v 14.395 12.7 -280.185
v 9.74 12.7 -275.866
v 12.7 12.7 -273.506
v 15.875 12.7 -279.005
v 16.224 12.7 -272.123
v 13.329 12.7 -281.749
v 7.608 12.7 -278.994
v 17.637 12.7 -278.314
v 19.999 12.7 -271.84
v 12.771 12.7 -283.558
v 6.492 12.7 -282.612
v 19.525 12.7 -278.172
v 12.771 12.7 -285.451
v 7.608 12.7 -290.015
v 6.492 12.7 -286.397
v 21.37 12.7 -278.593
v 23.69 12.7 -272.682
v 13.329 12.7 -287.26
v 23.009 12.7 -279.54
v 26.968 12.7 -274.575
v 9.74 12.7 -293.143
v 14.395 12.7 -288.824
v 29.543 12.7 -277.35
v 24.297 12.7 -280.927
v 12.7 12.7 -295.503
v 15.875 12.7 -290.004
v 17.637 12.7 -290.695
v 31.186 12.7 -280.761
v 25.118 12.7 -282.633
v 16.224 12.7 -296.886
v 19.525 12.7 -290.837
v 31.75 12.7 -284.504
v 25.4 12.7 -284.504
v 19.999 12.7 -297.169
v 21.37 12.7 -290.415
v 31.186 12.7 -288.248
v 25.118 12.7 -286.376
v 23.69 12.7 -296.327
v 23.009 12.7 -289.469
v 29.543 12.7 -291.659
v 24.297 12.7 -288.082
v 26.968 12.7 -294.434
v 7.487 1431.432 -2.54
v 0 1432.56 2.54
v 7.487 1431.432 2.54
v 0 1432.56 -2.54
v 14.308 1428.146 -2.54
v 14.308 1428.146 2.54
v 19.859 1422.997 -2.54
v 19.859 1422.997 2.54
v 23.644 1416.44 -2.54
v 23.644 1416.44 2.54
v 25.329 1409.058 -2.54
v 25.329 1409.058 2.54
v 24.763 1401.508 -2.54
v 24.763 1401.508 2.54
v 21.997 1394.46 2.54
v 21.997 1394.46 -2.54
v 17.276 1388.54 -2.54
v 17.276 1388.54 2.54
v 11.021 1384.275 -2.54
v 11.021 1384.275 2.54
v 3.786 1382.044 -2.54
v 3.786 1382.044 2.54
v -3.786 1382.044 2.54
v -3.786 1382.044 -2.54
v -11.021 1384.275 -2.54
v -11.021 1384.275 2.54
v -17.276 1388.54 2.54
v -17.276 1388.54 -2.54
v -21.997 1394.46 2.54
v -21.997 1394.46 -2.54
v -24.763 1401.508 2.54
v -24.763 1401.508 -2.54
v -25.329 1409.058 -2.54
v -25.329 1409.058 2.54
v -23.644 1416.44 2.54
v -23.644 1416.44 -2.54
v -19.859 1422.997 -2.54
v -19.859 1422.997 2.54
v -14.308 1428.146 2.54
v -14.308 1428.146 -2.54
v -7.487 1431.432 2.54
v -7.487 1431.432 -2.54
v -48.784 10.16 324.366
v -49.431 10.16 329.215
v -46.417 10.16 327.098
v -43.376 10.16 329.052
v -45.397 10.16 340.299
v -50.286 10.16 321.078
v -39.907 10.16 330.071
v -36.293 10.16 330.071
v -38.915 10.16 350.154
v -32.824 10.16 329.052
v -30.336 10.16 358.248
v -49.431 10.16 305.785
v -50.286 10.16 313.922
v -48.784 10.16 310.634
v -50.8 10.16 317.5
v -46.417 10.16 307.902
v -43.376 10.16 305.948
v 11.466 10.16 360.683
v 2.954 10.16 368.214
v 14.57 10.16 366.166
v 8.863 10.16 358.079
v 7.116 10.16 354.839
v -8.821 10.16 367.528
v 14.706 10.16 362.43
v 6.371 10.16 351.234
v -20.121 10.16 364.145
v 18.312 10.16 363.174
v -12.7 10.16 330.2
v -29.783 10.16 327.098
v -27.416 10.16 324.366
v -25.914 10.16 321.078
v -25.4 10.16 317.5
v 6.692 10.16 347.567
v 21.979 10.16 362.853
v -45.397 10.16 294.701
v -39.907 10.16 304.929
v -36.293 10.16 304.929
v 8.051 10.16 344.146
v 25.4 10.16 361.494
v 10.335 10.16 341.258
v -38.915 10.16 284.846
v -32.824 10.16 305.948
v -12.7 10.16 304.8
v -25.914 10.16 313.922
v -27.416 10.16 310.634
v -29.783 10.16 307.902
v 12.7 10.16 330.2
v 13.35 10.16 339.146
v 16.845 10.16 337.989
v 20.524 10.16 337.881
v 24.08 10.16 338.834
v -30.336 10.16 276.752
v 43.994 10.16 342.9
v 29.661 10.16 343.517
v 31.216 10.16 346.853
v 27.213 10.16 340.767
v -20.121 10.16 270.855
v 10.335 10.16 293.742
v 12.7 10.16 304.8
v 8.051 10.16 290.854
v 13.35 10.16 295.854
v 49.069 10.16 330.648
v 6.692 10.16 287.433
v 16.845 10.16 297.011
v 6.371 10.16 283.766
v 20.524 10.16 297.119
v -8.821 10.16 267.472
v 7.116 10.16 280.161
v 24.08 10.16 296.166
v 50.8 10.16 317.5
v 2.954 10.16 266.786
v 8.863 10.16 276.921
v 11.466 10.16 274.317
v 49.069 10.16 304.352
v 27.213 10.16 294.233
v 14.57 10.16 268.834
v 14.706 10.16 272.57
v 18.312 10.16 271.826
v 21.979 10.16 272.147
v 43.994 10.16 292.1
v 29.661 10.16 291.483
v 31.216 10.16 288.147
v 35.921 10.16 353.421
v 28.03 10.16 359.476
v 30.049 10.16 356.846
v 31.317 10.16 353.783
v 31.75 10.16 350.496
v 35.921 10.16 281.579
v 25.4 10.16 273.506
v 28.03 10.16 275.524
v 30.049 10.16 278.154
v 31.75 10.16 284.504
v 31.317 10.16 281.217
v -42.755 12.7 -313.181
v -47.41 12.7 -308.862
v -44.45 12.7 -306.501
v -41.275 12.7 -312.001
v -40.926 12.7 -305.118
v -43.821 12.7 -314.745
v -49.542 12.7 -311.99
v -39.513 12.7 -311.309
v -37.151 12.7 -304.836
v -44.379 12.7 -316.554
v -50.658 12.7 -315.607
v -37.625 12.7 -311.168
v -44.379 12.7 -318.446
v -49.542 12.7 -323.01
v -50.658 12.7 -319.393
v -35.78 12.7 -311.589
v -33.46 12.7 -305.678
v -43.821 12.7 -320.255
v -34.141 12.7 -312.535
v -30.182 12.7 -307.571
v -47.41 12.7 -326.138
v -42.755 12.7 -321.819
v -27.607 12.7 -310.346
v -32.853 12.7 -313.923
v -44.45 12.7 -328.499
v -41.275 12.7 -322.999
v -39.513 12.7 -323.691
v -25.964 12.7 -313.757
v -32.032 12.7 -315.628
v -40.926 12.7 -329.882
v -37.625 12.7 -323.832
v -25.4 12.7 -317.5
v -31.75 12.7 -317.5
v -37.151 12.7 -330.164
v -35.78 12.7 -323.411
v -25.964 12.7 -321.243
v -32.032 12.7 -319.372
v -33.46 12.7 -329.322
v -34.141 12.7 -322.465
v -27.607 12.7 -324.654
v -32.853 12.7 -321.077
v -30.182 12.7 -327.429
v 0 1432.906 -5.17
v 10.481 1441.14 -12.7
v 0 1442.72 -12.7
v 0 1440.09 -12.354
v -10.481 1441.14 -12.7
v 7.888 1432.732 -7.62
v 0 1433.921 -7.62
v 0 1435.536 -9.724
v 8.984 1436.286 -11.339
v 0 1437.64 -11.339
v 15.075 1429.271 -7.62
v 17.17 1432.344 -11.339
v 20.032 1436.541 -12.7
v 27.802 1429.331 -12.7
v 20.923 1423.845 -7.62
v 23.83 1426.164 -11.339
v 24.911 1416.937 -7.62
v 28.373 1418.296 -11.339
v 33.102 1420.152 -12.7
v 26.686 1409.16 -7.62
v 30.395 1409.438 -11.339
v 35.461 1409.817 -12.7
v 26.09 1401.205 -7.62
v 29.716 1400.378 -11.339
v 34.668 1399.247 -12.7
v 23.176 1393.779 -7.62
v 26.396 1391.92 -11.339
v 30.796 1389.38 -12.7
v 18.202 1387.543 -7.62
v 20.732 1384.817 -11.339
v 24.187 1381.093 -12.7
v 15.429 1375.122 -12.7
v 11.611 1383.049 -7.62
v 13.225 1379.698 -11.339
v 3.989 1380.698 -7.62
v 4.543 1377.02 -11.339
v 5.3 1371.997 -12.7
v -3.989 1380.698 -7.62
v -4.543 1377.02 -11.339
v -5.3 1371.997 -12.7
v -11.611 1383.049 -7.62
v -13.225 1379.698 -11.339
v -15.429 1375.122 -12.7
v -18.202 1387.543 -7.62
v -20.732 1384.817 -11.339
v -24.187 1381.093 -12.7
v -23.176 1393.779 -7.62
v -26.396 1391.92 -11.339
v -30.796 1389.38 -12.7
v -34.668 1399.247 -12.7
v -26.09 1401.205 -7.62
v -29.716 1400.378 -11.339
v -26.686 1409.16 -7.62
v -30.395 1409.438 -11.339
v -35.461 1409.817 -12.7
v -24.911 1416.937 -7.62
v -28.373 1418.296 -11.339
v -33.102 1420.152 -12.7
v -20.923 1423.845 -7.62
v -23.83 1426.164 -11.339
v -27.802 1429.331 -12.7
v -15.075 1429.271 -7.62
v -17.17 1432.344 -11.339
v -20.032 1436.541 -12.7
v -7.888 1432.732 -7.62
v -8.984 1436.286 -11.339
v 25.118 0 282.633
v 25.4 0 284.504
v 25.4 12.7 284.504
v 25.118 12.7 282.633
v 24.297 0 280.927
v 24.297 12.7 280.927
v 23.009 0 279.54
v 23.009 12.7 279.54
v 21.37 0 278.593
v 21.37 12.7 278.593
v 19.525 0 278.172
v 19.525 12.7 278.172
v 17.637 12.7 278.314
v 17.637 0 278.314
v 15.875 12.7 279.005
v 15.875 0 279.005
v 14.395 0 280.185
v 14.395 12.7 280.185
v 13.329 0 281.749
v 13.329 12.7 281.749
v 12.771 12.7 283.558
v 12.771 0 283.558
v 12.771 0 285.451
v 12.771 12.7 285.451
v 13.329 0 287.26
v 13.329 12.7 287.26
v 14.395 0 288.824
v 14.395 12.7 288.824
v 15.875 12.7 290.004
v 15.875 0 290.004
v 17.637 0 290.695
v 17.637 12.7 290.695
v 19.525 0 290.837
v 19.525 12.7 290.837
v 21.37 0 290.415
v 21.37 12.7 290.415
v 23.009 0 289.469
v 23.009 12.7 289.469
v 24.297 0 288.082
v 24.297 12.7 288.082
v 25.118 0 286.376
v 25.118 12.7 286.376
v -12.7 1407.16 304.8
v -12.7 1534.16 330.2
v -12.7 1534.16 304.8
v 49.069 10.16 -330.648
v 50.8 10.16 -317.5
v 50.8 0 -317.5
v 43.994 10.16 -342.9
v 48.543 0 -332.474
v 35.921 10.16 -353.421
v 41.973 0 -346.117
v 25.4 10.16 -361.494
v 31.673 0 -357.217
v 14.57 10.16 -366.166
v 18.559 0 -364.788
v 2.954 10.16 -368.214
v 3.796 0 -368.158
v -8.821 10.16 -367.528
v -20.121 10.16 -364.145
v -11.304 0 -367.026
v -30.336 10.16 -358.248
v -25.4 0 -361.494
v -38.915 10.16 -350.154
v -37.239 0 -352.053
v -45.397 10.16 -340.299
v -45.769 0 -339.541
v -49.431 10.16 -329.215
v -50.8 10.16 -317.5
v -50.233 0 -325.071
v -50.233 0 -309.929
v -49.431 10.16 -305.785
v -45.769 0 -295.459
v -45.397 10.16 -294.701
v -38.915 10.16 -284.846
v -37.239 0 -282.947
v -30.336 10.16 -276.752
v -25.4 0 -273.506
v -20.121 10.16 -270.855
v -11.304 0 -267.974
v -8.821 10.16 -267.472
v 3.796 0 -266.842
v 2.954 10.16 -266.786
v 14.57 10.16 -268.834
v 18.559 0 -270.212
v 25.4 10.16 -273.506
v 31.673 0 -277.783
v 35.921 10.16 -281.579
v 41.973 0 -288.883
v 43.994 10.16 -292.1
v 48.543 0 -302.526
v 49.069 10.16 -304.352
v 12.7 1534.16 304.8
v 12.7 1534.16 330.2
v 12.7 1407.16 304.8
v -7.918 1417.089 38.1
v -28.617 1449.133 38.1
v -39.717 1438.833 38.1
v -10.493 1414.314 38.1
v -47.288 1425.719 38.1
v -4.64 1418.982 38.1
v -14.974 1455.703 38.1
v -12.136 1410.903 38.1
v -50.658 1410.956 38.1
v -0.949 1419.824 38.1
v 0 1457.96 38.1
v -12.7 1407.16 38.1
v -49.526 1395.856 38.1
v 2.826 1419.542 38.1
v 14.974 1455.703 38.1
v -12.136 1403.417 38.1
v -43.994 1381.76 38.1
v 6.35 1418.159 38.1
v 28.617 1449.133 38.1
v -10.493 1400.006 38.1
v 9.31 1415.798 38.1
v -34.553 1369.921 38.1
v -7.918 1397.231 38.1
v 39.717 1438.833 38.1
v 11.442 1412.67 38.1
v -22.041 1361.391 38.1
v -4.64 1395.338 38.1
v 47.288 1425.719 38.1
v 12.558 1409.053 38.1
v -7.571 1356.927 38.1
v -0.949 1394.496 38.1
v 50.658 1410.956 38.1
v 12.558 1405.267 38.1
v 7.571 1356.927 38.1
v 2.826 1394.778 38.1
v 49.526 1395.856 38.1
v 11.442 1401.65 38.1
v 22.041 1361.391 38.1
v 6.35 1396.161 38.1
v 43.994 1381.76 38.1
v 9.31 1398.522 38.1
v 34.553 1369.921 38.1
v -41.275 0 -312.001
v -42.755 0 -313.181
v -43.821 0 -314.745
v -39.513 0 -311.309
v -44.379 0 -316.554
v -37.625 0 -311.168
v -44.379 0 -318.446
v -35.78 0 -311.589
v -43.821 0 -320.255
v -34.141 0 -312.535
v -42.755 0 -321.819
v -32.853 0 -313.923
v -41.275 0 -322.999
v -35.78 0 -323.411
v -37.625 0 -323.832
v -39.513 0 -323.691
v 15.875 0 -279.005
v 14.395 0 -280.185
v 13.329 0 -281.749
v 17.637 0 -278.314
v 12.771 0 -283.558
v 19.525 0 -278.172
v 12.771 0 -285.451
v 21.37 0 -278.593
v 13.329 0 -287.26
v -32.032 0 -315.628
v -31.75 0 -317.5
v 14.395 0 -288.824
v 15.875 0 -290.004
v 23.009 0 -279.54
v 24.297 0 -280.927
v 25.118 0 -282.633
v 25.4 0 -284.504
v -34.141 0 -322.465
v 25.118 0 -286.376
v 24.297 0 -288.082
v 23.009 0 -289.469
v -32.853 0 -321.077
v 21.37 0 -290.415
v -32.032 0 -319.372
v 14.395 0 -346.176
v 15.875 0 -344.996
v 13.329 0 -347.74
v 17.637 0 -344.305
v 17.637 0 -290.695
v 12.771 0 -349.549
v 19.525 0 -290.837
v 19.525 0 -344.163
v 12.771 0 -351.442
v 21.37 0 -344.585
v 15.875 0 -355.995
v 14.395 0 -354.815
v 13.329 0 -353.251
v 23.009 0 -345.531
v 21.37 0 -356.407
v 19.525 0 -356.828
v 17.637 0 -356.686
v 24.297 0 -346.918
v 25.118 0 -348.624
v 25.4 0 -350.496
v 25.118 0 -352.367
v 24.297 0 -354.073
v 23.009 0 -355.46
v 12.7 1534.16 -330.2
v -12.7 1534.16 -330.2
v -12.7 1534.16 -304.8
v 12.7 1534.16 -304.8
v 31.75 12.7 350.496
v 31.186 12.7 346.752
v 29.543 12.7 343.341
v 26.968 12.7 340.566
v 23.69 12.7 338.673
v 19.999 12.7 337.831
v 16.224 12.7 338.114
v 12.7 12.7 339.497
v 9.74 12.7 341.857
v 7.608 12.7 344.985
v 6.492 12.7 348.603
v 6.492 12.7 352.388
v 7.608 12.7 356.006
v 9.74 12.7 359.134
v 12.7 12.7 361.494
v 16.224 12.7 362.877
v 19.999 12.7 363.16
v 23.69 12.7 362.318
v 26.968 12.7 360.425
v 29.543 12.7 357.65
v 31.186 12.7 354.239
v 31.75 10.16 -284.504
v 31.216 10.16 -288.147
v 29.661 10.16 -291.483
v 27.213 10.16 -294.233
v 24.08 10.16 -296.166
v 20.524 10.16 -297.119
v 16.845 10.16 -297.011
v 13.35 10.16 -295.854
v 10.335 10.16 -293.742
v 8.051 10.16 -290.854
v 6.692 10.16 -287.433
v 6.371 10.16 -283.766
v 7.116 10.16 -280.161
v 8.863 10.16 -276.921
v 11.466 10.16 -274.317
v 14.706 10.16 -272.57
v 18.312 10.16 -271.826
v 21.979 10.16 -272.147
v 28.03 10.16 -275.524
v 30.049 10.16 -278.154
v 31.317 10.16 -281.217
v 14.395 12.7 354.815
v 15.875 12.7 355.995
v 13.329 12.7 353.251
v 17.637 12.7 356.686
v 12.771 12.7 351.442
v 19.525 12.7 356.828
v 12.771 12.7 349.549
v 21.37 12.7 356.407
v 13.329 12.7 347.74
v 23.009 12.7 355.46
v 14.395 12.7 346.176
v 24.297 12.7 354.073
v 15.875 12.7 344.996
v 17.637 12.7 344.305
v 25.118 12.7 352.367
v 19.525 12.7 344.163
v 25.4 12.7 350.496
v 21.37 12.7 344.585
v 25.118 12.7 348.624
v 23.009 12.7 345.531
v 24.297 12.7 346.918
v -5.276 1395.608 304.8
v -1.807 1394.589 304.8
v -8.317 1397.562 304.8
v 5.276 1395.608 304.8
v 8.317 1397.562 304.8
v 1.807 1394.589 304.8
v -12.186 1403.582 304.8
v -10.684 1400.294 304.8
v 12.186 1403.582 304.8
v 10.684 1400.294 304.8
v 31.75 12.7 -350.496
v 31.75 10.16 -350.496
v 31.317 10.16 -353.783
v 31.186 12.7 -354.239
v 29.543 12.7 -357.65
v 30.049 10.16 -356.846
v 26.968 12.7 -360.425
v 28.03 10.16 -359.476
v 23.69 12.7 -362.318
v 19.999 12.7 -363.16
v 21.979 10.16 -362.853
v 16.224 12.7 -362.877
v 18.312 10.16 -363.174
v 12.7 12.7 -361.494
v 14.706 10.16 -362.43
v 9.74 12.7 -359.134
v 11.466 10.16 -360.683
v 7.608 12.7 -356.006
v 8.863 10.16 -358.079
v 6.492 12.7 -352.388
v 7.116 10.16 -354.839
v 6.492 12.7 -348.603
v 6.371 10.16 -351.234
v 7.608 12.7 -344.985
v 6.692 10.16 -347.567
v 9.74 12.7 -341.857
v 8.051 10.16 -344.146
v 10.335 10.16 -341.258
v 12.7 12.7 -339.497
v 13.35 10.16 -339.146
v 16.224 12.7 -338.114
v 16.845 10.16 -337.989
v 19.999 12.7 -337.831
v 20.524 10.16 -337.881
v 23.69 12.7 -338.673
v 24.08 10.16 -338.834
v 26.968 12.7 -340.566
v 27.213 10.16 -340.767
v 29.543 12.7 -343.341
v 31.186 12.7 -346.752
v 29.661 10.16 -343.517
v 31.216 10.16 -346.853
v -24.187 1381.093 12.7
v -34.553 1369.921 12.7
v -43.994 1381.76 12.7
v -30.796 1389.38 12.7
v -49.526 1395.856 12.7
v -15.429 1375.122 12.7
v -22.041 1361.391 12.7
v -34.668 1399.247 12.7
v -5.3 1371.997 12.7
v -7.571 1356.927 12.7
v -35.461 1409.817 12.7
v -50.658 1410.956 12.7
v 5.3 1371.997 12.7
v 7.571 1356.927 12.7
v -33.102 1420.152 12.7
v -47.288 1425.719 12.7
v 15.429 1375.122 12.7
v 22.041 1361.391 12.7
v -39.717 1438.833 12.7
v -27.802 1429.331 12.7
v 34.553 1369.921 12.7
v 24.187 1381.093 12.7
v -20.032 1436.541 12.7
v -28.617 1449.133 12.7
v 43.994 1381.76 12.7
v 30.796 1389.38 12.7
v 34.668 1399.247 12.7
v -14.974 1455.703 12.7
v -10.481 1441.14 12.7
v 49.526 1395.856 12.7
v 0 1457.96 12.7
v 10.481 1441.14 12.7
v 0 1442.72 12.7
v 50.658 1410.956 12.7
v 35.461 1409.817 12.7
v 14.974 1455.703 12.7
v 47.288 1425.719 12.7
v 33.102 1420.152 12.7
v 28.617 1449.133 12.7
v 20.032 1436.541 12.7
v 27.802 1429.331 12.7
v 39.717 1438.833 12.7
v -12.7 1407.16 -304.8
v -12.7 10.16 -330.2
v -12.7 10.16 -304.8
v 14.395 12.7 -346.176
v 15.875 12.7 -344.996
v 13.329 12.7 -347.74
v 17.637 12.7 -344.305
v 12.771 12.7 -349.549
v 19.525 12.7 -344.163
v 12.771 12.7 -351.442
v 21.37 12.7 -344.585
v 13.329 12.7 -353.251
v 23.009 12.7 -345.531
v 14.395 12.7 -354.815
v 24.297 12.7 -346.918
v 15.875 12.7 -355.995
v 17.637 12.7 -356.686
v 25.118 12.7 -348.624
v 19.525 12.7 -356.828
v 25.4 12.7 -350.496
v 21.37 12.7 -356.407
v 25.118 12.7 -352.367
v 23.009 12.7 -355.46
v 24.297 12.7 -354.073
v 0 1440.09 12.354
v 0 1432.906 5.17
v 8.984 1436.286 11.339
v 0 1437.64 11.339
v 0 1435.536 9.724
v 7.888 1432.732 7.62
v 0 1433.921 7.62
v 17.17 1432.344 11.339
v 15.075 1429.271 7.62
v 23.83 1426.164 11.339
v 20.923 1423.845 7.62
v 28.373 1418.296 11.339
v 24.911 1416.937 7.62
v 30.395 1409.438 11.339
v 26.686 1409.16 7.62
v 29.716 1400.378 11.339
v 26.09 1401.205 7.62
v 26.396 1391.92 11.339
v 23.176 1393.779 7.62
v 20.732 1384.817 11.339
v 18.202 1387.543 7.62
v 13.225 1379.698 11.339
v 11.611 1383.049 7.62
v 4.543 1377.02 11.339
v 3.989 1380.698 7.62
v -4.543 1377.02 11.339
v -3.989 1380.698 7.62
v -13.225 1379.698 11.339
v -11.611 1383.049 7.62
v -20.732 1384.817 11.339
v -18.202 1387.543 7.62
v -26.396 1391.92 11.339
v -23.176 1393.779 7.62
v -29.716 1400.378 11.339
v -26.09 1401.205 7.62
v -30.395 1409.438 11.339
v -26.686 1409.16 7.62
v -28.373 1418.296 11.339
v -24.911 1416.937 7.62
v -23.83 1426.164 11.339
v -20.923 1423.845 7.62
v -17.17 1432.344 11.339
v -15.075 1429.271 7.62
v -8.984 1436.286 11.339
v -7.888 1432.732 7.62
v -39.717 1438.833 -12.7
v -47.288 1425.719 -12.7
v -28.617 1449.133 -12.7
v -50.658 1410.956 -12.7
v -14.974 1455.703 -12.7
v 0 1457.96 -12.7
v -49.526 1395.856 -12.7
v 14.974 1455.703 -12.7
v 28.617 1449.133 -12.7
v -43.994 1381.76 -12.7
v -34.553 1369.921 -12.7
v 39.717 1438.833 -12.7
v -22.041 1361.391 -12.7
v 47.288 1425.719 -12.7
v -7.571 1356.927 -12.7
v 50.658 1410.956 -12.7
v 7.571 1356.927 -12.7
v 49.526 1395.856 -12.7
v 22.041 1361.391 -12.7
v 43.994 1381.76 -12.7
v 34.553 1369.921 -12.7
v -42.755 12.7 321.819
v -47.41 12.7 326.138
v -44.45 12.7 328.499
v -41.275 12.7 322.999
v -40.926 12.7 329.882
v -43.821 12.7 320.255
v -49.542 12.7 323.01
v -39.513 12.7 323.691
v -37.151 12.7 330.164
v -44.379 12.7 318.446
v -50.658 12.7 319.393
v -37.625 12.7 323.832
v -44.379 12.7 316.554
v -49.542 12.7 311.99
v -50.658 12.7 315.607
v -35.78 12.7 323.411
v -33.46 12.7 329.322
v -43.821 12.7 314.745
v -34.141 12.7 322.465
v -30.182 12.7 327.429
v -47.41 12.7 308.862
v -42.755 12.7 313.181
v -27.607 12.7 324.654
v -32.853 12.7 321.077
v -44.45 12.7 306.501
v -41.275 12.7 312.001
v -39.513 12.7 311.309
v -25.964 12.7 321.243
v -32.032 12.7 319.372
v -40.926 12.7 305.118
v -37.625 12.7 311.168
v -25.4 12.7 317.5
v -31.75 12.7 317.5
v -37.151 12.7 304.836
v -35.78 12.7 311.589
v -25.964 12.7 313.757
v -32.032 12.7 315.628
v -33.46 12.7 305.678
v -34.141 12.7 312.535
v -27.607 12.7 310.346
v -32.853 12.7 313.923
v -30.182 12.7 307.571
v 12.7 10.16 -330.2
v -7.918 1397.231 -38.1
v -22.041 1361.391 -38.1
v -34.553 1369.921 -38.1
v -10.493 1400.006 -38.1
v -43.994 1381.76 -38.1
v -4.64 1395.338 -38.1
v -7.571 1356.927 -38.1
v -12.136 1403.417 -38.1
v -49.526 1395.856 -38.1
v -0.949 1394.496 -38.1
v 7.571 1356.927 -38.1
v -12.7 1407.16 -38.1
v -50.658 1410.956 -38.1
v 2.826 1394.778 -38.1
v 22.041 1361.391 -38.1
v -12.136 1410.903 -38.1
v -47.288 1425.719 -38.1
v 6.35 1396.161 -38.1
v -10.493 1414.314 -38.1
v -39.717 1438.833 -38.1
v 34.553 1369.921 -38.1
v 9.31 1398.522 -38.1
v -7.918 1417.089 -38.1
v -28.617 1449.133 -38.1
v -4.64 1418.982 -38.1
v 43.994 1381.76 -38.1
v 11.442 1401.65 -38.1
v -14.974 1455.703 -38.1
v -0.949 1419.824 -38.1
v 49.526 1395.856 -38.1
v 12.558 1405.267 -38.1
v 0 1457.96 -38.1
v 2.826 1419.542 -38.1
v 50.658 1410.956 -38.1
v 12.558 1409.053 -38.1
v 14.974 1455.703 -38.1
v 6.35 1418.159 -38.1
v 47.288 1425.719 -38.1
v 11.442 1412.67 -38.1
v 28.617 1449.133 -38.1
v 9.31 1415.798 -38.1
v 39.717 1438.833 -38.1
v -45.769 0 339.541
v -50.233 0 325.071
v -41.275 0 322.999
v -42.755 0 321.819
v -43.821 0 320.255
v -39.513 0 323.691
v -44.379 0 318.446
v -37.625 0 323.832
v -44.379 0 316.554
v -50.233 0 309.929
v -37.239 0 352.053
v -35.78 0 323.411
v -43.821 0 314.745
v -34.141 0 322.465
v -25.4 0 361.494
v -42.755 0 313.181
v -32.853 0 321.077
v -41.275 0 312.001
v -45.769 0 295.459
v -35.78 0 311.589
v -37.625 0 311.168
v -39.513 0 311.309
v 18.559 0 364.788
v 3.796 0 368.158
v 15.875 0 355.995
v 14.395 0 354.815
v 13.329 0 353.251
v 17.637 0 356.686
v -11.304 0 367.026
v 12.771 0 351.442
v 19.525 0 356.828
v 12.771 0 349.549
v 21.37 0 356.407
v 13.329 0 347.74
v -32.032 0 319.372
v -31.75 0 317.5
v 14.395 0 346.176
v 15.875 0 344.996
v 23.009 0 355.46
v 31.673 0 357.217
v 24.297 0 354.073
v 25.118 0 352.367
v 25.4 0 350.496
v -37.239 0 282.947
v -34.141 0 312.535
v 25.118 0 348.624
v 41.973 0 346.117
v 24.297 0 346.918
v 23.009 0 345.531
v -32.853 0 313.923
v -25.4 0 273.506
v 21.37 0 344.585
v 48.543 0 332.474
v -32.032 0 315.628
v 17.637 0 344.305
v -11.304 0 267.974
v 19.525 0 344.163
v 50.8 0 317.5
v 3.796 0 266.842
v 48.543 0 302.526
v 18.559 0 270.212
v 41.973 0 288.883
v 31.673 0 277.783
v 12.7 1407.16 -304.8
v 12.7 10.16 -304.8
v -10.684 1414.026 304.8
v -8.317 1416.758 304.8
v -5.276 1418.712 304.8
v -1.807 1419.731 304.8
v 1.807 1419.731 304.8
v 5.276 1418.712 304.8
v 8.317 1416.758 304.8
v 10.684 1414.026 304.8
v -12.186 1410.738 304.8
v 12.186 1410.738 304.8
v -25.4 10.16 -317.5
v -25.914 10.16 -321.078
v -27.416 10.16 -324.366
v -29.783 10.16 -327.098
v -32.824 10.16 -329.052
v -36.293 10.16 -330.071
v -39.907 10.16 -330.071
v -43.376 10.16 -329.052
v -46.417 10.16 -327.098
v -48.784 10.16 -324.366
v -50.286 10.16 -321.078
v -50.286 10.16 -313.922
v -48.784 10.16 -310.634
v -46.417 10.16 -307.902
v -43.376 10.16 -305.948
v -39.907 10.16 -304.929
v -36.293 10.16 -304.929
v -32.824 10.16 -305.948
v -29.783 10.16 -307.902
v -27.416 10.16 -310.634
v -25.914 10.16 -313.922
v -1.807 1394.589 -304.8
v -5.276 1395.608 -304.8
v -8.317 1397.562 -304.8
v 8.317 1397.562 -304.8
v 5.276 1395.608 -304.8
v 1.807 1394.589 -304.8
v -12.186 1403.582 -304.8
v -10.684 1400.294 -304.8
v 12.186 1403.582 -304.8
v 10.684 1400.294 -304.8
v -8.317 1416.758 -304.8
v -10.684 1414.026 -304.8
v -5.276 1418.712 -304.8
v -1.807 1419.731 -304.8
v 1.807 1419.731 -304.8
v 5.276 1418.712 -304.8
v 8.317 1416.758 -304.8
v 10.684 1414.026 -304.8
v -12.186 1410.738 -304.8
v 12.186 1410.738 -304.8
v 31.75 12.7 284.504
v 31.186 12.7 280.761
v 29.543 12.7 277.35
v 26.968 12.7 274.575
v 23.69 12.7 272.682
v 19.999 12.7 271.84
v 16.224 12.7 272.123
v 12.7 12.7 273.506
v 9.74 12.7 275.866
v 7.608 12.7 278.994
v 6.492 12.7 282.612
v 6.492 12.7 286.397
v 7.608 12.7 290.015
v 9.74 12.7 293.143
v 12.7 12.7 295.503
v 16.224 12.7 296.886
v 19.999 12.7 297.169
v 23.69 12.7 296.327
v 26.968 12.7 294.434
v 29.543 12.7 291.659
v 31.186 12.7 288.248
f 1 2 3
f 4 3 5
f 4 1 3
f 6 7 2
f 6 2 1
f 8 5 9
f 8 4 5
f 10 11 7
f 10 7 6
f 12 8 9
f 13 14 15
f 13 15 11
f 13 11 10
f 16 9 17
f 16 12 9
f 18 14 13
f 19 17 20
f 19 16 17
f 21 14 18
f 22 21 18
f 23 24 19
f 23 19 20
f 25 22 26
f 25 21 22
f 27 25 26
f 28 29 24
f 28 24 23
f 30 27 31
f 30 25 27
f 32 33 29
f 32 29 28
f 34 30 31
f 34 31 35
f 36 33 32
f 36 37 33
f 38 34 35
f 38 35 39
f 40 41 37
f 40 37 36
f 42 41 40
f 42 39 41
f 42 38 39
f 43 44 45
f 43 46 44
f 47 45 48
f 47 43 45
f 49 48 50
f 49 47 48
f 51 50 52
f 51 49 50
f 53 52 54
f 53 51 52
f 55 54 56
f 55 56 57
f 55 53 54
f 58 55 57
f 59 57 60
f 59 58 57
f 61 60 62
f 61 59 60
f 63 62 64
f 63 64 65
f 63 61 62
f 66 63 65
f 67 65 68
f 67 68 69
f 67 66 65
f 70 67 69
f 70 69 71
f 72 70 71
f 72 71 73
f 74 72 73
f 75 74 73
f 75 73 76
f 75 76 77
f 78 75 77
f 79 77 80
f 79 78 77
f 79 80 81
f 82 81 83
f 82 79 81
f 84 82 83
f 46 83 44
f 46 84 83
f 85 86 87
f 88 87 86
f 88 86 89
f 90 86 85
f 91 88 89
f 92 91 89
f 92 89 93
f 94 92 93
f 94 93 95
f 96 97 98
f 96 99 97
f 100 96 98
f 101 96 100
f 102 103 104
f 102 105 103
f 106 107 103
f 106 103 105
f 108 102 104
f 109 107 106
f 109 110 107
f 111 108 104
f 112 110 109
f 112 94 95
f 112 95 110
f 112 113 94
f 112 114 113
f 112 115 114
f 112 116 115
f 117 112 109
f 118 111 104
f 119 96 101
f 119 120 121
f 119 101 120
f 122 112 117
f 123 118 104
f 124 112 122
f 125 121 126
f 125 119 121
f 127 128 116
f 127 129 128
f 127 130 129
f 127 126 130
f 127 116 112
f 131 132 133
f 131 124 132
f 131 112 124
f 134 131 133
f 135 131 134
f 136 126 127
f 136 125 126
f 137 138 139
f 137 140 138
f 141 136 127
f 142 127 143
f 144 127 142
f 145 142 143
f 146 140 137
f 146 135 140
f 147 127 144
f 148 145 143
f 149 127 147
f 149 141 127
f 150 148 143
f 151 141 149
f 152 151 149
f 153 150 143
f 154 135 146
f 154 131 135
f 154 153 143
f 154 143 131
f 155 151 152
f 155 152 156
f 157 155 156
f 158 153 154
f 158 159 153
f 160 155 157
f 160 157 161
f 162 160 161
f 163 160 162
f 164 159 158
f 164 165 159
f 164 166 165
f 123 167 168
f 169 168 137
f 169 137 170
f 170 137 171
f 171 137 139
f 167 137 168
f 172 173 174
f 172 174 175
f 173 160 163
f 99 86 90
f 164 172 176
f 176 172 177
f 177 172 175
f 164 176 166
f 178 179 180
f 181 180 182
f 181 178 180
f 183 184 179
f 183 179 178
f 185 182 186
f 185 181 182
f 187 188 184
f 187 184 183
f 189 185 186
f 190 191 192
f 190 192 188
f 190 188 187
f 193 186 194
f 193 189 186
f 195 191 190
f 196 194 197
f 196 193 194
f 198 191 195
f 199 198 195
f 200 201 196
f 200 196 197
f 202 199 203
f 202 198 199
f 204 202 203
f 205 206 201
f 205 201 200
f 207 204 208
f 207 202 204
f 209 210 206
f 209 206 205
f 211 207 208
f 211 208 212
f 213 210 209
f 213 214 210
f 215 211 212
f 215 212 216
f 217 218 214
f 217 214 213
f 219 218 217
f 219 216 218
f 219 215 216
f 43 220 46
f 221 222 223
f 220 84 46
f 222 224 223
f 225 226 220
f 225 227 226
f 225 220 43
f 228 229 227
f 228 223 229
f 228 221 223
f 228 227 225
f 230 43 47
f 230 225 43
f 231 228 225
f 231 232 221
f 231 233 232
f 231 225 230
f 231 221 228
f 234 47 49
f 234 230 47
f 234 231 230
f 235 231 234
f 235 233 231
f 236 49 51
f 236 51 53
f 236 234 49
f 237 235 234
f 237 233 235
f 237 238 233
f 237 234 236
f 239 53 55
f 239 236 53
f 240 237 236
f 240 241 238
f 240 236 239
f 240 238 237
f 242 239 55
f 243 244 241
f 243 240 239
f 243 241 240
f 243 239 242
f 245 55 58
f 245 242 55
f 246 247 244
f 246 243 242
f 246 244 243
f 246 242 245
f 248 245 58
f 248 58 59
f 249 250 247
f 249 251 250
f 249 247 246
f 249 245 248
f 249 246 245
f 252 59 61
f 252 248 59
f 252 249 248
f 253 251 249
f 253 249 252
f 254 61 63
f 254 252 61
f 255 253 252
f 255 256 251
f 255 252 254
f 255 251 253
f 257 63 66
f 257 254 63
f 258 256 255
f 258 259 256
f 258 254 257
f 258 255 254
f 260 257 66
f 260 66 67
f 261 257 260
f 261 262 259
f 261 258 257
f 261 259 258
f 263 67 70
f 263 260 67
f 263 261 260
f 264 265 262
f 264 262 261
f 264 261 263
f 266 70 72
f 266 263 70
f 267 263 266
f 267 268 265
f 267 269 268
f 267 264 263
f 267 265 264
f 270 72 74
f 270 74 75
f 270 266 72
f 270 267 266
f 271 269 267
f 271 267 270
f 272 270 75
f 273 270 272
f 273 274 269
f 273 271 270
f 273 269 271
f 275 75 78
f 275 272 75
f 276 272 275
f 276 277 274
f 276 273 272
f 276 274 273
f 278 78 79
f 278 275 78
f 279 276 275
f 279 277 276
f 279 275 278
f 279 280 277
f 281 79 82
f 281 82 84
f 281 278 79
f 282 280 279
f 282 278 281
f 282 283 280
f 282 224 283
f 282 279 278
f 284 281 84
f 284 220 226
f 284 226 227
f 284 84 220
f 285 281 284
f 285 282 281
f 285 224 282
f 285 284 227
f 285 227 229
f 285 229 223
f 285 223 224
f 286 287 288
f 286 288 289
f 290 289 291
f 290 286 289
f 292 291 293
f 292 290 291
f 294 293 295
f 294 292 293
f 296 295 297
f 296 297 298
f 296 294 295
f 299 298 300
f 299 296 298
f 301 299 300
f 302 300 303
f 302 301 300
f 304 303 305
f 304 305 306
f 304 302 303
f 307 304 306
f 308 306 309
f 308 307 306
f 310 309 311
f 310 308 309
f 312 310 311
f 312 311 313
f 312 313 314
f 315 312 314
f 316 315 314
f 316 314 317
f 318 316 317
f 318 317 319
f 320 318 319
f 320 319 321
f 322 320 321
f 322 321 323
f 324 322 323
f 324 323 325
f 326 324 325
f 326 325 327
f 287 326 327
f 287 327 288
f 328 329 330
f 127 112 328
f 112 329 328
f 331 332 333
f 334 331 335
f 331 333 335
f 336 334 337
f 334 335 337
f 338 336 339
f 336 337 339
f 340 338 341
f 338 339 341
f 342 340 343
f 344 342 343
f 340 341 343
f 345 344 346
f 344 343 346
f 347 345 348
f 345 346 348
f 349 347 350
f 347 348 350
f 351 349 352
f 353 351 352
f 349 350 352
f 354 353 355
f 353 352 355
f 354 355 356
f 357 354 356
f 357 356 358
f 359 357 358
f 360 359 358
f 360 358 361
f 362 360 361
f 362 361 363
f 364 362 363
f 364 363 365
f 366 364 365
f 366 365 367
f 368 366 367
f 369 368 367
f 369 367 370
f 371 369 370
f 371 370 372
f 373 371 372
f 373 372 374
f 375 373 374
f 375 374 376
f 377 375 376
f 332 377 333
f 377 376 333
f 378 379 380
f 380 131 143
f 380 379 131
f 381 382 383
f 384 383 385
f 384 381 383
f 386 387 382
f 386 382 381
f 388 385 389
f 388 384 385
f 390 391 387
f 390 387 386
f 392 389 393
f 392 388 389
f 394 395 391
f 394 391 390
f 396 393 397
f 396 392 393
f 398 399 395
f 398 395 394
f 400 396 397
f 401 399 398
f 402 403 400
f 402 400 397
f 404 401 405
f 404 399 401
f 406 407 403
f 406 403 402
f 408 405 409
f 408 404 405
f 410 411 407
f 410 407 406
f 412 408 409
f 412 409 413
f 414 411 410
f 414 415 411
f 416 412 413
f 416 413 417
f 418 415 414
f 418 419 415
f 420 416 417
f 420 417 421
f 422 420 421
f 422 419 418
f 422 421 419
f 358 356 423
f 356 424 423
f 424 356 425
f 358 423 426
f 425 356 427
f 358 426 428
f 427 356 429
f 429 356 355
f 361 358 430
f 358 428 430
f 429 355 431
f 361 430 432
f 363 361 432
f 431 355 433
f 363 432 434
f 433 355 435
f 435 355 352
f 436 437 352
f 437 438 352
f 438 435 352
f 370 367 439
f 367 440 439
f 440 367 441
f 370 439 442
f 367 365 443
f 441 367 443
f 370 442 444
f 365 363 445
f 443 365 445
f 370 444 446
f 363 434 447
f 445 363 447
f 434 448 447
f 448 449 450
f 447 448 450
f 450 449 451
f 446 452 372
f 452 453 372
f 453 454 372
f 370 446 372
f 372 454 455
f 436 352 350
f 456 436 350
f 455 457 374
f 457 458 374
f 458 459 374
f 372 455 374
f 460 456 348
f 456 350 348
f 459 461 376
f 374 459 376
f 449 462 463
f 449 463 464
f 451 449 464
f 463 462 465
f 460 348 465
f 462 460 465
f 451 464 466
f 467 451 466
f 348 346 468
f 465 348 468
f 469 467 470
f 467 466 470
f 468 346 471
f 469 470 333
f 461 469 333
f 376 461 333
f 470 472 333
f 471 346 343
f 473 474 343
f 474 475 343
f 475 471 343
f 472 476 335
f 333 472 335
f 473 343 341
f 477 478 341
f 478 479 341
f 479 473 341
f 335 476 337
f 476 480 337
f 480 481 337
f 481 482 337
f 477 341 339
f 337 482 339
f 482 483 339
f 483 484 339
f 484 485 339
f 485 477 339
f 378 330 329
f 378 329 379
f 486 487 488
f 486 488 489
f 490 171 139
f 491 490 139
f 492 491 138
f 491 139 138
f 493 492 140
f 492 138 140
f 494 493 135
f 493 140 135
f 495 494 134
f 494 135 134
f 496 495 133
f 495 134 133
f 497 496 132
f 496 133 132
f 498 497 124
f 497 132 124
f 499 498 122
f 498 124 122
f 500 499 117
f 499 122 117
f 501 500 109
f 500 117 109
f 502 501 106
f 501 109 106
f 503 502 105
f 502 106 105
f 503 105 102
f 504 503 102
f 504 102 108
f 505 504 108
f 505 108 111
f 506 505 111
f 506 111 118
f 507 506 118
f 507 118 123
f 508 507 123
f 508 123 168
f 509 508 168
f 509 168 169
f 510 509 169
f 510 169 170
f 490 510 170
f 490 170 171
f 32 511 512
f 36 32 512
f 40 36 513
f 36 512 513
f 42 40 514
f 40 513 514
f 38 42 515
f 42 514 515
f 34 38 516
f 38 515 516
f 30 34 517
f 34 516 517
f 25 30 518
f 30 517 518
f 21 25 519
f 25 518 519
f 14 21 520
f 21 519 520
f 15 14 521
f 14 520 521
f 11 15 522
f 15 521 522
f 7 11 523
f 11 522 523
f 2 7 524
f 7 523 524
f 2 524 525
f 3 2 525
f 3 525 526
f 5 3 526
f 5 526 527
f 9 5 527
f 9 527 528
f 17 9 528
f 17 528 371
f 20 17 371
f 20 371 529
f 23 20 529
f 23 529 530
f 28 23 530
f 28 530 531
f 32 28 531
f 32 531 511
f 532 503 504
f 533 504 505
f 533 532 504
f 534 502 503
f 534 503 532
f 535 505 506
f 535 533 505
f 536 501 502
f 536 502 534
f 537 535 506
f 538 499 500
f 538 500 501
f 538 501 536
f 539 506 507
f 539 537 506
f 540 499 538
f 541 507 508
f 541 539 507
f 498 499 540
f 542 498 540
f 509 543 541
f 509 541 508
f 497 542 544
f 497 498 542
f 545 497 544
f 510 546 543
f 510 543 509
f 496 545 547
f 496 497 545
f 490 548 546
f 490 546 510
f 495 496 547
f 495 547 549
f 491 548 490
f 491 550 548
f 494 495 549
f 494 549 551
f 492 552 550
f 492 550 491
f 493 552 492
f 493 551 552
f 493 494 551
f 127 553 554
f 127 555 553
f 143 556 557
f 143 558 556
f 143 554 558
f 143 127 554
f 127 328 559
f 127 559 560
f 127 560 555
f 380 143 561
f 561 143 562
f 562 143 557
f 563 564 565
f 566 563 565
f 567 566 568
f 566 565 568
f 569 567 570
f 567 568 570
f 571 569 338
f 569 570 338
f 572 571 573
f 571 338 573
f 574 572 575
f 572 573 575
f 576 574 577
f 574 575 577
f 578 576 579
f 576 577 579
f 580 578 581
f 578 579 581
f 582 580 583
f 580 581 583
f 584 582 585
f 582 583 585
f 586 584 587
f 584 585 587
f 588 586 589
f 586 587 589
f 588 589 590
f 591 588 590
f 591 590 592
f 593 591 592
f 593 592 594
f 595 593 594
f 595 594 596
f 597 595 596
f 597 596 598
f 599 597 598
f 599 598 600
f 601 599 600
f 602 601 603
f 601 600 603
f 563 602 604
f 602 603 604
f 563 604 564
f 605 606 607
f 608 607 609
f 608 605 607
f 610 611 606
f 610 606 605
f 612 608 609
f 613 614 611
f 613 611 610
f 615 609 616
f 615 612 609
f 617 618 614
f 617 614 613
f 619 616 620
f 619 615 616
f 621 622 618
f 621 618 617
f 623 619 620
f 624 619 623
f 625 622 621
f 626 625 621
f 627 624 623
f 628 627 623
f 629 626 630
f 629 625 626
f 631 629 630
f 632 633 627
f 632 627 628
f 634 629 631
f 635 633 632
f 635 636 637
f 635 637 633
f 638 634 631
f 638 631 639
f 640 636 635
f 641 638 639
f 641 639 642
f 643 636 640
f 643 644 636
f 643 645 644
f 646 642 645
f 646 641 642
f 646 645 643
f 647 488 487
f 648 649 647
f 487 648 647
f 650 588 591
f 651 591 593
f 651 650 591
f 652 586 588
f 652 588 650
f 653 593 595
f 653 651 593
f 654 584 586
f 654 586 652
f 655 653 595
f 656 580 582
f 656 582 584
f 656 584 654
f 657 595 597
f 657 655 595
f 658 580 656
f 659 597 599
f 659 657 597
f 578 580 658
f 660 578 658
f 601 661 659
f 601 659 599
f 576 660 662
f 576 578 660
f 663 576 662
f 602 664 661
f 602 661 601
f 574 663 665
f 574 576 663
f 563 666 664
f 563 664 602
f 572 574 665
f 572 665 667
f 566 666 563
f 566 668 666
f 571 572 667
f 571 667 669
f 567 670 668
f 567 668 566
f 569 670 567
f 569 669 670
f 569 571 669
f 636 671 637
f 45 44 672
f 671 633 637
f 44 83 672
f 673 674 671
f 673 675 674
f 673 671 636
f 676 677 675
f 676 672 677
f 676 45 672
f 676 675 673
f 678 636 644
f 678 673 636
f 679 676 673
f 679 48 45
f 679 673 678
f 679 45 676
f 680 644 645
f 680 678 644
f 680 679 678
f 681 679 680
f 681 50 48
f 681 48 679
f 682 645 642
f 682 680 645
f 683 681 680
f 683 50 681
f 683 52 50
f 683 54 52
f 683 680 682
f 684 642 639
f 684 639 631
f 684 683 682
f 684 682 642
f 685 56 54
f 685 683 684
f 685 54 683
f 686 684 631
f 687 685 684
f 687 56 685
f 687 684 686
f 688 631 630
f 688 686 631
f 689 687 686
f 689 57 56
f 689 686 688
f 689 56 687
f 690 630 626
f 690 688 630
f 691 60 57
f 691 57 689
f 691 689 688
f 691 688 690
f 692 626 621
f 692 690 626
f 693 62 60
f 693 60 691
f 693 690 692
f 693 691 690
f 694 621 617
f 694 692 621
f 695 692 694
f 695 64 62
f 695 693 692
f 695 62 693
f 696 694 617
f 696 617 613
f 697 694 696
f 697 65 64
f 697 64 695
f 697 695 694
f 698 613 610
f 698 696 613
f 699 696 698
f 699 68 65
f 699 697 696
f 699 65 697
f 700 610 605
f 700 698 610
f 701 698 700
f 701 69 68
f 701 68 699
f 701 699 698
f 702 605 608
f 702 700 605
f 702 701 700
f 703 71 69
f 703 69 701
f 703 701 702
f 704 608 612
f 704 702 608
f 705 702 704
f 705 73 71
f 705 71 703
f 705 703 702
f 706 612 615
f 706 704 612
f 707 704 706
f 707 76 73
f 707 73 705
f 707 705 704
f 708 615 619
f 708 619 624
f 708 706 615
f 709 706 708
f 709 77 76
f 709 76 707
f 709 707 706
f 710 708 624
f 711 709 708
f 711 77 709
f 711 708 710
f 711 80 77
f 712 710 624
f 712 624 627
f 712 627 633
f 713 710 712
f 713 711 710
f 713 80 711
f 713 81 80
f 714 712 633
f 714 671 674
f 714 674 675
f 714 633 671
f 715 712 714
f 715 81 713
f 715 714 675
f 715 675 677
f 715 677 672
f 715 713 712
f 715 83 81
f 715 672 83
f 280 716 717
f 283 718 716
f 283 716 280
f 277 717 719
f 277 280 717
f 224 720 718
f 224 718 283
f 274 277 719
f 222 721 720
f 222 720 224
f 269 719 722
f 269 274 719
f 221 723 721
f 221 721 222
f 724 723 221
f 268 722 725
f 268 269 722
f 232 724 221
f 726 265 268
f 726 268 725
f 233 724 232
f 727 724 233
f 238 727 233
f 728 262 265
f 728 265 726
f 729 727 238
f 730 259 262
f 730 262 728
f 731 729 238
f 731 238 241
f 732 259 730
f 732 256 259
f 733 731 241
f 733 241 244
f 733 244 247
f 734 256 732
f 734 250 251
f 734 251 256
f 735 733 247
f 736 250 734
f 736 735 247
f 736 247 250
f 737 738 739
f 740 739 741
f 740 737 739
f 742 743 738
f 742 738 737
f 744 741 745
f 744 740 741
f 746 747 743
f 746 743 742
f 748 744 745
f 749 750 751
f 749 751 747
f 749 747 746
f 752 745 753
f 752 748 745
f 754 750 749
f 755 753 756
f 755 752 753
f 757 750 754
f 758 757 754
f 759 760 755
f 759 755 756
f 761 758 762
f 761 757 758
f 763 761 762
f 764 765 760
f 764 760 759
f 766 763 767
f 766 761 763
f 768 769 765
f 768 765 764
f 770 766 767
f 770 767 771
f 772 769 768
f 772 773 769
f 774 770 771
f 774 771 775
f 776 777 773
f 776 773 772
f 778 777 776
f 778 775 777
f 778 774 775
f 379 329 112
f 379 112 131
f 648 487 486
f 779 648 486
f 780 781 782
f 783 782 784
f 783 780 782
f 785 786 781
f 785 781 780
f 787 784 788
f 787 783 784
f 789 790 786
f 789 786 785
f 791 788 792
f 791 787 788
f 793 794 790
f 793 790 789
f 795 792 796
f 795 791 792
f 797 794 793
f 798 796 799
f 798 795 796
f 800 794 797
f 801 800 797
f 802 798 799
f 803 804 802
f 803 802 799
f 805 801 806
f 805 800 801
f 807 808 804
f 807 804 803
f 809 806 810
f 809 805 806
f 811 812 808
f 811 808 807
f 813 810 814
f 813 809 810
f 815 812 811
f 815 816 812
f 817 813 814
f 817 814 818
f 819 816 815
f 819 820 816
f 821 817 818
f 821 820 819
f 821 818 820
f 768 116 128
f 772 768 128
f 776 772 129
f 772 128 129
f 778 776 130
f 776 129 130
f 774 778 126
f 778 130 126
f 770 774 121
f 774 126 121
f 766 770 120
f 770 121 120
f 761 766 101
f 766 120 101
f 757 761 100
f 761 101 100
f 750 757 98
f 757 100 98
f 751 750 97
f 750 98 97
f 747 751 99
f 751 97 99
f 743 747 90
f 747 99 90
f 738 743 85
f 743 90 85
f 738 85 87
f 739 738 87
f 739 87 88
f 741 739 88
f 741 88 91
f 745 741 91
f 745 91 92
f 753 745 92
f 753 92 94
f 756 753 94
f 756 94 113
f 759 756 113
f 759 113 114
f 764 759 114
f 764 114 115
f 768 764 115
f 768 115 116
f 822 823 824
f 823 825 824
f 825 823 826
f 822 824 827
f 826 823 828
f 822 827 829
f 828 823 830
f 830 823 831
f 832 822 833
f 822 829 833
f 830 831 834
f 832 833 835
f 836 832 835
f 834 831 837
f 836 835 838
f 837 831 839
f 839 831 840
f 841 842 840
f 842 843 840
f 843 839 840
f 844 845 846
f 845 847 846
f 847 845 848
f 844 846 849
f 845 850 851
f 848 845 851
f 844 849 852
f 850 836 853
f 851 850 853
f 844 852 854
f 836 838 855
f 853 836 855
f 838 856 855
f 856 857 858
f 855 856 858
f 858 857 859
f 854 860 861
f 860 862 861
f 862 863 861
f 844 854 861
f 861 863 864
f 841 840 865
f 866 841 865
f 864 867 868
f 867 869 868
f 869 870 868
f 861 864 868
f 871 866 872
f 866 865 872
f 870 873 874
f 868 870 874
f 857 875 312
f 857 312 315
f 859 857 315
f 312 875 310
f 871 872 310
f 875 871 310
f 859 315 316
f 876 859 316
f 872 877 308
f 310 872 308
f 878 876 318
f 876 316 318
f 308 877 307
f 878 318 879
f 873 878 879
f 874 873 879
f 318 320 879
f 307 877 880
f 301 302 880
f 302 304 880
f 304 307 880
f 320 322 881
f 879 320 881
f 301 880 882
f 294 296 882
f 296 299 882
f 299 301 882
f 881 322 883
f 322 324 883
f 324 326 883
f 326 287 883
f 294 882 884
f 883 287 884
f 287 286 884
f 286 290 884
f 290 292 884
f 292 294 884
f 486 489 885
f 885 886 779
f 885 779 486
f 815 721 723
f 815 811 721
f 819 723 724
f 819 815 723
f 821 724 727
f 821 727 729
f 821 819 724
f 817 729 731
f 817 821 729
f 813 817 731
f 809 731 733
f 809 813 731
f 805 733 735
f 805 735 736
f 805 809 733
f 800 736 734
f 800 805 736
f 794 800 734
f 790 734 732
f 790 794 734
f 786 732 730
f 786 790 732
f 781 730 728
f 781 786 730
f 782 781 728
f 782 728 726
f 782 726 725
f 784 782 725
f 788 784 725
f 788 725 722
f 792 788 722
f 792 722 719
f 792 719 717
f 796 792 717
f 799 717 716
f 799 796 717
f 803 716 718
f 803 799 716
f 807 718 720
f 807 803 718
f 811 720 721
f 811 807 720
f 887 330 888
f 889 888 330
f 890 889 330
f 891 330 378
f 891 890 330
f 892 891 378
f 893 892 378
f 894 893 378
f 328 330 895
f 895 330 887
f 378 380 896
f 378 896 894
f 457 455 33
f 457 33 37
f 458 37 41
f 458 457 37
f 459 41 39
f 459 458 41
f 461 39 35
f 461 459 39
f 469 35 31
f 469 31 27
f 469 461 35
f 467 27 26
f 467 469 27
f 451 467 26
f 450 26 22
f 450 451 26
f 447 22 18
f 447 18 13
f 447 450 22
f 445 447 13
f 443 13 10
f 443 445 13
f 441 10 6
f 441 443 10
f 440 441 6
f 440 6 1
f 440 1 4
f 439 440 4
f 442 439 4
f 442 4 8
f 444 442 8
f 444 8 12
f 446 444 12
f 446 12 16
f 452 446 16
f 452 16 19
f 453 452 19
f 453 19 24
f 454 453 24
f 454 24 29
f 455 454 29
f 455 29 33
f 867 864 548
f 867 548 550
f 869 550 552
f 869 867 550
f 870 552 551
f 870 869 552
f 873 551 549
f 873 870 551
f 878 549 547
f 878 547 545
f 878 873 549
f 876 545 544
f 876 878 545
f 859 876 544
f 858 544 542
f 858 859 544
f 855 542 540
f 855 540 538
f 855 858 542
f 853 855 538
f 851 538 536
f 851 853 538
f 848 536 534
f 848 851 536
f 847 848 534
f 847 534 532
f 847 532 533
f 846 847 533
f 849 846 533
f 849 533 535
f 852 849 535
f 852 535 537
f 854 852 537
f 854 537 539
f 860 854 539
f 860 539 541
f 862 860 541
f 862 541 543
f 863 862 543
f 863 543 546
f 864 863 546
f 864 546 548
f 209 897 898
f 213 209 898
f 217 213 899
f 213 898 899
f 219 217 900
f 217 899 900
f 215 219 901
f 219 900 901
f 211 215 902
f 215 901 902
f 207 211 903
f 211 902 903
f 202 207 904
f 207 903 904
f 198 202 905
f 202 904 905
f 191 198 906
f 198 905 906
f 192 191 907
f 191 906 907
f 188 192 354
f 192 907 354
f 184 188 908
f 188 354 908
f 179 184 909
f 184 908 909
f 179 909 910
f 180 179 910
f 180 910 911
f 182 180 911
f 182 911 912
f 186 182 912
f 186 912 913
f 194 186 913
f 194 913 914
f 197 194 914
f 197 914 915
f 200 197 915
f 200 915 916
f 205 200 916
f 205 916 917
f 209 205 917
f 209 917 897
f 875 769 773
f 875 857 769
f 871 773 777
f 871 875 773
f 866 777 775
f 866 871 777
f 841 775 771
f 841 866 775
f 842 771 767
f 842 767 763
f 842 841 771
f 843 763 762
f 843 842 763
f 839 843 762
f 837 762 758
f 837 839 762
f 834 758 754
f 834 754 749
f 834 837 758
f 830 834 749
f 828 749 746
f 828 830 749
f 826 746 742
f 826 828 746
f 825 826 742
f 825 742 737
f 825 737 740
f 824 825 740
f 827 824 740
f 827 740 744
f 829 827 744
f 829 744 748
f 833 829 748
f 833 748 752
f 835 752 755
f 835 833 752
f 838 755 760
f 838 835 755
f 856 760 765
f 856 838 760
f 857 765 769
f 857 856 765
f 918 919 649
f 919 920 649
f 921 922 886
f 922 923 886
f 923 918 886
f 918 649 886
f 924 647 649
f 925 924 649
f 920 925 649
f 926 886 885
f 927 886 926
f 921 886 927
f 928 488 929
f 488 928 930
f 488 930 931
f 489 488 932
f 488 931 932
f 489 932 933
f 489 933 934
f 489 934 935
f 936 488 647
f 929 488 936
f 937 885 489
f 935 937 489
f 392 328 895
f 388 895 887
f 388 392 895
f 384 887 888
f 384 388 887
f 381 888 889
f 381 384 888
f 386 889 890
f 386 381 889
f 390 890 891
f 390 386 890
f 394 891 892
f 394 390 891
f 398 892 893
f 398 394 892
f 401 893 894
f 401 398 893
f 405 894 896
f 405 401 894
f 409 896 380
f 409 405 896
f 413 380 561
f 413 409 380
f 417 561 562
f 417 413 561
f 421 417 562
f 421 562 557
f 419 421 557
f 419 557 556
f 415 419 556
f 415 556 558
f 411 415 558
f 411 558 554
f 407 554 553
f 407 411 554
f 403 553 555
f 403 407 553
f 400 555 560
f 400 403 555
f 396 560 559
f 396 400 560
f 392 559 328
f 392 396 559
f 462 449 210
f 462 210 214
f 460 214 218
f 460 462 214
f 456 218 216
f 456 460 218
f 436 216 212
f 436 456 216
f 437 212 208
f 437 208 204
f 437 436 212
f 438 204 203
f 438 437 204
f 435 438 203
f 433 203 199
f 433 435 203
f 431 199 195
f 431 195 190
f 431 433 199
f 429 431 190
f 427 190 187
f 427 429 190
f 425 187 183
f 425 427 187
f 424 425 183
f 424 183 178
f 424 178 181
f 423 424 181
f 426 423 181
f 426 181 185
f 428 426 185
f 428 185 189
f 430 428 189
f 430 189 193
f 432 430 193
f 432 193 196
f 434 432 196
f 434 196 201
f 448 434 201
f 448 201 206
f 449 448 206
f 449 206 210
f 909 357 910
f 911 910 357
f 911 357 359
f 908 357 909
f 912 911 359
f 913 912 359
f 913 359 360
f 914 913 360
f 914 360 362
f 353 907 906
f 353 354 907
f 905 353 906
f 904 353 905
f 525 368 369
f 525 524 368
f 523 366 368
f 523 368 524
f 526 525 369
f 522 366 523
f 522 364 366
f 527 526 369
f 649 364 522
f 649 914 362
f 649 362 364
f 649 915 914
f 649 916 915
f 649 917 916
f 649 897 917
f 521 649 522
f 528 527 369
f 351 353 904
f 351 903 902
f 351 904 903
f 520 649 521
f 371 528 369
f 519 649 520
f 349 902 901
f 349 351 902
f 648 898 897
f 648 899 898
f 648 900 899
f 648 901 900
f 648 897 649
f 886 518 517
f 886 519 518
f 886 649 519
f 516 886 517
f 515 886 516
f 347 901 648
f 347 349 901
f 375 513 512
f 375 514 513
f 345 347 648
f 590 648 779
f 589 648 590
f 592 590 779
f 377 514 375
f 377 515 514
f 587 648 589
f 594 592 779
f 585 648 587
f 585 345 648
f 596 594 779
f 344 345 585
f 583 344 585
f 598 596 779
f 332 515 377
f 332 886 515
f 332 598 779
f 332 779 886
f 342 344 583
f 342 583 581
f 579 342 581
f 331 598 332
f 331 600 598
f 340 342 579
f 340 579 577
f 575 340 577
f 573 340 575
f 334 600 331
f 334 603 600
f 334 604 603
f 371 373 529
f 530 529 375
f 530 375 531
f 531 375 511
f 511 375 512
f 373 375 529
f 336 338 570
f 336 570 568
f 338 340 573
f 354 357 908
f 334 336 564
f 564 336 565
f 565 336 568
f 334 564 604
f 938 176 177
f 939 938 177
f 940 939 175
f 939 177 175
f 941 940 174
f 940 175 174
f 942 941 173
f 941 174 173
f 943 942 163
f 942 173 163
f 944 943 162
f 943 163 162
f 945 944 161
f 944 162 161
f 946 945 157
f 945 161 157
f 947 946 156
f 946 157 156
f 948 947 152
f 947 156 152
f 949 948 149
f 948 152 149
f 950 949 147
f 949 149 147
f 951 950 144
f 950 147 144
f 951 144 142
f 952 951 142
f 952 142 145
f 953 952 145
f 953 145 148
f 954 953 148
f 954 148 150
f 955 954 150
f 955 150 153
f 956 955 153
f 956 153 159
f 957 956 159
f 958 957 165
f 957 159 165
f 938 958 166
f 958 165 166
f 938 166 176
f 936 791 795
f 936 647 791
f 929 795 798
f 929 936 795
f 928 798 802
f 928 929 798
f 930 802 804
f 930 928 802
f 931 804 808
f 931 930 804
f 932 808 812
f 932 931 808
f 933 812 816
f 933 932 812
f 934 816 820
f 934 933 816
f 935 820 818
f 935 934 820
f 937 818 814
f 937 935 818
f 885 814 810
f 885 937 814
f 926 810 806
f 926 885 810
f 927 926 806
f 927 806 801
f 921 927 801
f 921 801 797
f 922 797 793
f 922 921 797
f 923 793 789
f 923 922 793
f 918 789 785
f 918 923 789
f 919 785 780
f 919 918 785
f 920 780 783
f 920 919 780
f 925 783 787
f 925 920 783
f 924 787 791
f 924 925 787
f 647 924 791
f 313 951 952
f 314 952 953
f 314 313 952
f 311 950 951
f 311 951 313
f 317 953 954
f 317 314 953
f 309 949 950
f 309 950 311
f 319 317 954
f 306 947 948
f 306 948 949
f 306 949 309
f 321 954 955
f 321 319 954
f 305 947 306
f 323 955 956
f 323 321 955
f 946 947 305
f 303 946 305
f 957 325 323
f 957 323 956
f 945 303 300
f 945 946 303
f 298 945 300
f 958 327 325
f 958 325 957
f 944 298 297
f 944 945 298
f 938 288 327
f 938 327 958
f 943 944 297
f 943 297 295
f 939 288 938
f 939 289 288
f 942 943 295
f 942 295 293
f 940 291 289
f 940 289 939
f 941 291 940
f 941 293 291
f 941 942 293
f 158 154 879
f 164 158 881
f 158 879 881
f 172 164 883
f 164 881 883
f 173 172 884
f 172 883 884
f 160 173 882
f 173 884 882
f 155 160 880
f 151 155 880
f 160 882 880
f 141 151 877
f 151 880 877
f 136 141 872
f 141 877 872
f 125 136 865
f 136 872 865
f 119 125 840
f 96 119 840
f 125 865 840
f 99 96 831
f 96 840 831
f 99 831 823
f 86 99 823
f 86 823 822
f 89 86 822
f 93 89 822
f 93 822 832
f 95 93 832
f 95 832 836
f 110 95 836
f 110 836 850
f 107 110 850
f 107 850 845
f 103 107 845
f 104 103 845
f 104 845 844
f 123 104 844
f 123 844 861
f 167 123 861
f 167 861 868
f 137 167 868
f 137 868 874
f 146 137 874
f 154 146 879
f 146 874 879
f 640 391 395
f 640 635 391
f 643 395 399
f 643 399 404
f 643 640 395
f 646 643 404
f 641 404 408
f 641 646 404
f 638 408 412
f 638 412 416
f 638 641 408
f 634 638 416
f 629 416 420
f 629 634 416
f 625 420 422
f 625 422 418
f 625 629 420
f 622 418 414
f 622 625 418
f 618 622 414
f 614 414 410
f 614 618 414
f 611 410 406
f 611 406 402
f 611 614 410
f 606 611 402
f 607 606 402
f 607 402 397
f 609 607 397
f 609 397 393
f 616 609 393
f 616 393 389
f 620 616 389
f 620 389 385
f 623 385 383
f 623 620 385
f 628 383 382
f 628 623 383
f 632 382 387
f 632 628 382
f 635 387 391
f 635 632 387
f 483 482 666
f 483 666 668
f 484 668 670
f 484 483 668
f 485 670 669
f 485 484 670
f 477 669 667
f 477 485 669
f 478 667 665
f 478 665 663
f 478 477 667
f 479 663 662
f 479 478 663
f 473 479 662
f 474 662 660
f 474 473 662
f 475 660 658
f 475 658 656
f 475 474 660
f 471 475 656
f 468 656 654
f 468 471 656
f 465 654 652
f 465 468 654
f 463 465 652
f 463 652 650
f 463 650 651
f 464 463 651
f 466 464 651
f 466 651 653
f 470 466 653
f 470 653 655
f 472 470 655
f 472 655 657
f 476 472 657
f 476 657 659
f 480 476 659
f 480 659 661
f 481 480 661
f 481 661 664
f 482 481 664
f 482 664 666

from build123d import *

# Parameters (mm, degrees)
SKETCH1_R             = 50.8
SKETCH1_R_2           = 6.35
BOSS_EXTRUDE1_DEPTH   = 10.16
BOSS_EXTRUDE1_2_DEPTH = 10.16
SKETCH2_W             = 25.4
SKETCH2_H             = 25.4
BOSS_EXTRUDE2_DEPTH   = 1524
SKETCH3_R             = 12.7
SKETCH8_R             = 12.7
SKETCH8_R_2           = 6.35
BOSS_EXTRUDE3_DEPTH   = 2.54


with BuildPart() as part:
    # Sketch1 → Boss-Extrude1 (new body)
    with BuildSketch(Plane(origin=(0, 0, 0), x_dir=(1, 0, 0), z_dir=(0, 1, 0))):
        with Locations((0, 317.5)):
            Circle(SKETCH1_R)
        with Locations((-38.1, 317.5)):
            Circle(SKETCH1_R_2, mode=Mode.SUBTRACT)
        with Locations((19.05, 350.495567884)):
            Circle(SKETCH1_R_2, mode=Mode.SUBTRACT)
        with Locations((19.05, 284.504432116)):
            Circle(SKETCH1_R_2, mode=Mode.SUBTRACT)
    extrude(amount=BOSS_EXTRUDE1_DEPTH)



with BuildPart() as body_2:
    # Sketch1 → Boss-Extrude1 2 (new body)
    with BuildSketch(Plane(origin=(0, 0, 0), x_dir=(1, 0, 0), z_dir=(0, 1, 0))):
        with Locations((0, -317.5)):
            Circle(SKETCH1_R)
        with Locations((19.05, -284.504432116)):
            Circle(SKETCH1_R_2, mode=Mode.SUBTRACT)
        with Locations((19.05, -350.495567884)):
            Circle(SKETCH1_R_2, mode=Mode.SUBTRACT)
        with Locations((-38.1, -317.5)):
            Circle(SKETCH1_R_2, mode=Mode.SUBTRACT)
    extrude(amount=BOSS_EXTRUDE1_2_DEPTH)


with BuildPart() as part_1:
    add(part.part)

    add(body_2.part)  # Boss-Extrude2 merges body 2
    # Sketch2 → Boss-Extrude2 (add)
    with BuildSketch(Plane(origin=(0, 10.16, 0), x_dir=(1, 0, 0), z_dir=(0, 1, 0))):
        with Locations((0, 317.5)):
            Rectangle(SKETCH2_W, SKETCH2_H)
        with Locations((0, -317.5)):
            Rectangle(SKETCH2_W, SKETCH2_H)
    extrude(amount=BOSS_EXTRUDE2_DEPTH)

    # Sweep1: sweep along a path in Sketch5
    with BuildLine(Plane(origin=(0, 0, 0), x_dir=(0, 0, -1), z_dir=(1, 0, 0))) as sweep1_path:
        Line((-304.8, 1407.16), (304.8, 1407.16))
    # Sketch3 → Sweep1 (sweep)
    with BuildSketch(Plane(origin=(0, 0, 304.8), x_dir=(-1, 0, 0), z_dir=(0, 0, -1))):
        with Locations((0, 1407.16)):
            Circle(SKETCH3_R)
    sweep(path=sweep1_path.line)

    # Sketch7 → Revolve2 (revolve)
    with BuildSketch(Plane(origin=(0, 0, 0), x_dir=(0, 0, -1), z_dir=(1, 0, 0))):
        with BuildLine():
            Line((-38.1, 1419.86), (-38.1, 1457.96))
            Line((-38.1, 1457.96), (-12.7, 1457.96))
            Line((-12.7, 1457.96), (-12.7, 1442.72))
            ThreePointArc((-12.7, 1442.72), (-9.724204897, 1435.535795103), (-2.54, 1432.56))
            Line((-2.54, 1432.56), (2.54, 1432.56))
            ThreePointArc((2.54, 1432.56), (9.724204897, 1435.535795103), (12.7, 1442.72))
            Line((12.7, 1442.72), (12.7, 1457.96))
            Line((12.7, 1457.96), (38.1, 1457.96))
            Line((38.1, 1457.96), (38.1, 1419.86))
            Line((38.1, 1419.86), (-38.1, 1419.86))
        make_face()
    revolve(axis=Axis((0, 1407.16, 304.8), (0, 0, -1)))

    # Sketch8 → Boss-Extrude3 (add)
    with BuildSketch(Plane(origin=(0, 10.16, 0), x_dir=(1, 0, 0), z_dir=(0, 1, 0))):
        with Locations((-38.1, -317.5)):
            Circle(SKETCH8_R)
        with Locations((-38.1, -317.5)):
            Circle(SKETCH8_R_2, mode=Mode.SUBTRACT)
        with Locations((19.05, -284.504432116)):
            Circle(SKETCH8_R)
        with Locations((19.05, -284.504432116)):
            Circle(SKETCH8_R_2, mode=Mode.SUBTRACT)
        with Locations((19.05, -350.495567884)):
            Circle(SKETCH8_R)
        with Locations((19.05, -350.495567884)):
            Circle(SKETCH8_R_2, mode=Mode.SUBTRACT)
        with Locations((19.05, 350.495567884)):
            Circle(SKETCH8_R)
        with Locations((19.05, 350.495567884)):
            Circle(SKETCH8_R_2, mode=Mode.SUBTRACT)
        with Locations((19.05, 284.504432116)):
            Circle(SKETCH8_R)
        with Locations((19.05, 284.504432116)):
            Circle(SKETCH8_R_2, mode=Mode.SUBTRACT)
        with Locations((-38.1, 317.5)):
            Circle(SKETCH8_R)
        with Locations((-38.1, 317.5)):
            Circle(SKETCH8_R_2, mode=Mode.SUBTRACT)
    extrude(amount=BOSS_EXTRUDE3_DEPTH)


solid = part_1.part
